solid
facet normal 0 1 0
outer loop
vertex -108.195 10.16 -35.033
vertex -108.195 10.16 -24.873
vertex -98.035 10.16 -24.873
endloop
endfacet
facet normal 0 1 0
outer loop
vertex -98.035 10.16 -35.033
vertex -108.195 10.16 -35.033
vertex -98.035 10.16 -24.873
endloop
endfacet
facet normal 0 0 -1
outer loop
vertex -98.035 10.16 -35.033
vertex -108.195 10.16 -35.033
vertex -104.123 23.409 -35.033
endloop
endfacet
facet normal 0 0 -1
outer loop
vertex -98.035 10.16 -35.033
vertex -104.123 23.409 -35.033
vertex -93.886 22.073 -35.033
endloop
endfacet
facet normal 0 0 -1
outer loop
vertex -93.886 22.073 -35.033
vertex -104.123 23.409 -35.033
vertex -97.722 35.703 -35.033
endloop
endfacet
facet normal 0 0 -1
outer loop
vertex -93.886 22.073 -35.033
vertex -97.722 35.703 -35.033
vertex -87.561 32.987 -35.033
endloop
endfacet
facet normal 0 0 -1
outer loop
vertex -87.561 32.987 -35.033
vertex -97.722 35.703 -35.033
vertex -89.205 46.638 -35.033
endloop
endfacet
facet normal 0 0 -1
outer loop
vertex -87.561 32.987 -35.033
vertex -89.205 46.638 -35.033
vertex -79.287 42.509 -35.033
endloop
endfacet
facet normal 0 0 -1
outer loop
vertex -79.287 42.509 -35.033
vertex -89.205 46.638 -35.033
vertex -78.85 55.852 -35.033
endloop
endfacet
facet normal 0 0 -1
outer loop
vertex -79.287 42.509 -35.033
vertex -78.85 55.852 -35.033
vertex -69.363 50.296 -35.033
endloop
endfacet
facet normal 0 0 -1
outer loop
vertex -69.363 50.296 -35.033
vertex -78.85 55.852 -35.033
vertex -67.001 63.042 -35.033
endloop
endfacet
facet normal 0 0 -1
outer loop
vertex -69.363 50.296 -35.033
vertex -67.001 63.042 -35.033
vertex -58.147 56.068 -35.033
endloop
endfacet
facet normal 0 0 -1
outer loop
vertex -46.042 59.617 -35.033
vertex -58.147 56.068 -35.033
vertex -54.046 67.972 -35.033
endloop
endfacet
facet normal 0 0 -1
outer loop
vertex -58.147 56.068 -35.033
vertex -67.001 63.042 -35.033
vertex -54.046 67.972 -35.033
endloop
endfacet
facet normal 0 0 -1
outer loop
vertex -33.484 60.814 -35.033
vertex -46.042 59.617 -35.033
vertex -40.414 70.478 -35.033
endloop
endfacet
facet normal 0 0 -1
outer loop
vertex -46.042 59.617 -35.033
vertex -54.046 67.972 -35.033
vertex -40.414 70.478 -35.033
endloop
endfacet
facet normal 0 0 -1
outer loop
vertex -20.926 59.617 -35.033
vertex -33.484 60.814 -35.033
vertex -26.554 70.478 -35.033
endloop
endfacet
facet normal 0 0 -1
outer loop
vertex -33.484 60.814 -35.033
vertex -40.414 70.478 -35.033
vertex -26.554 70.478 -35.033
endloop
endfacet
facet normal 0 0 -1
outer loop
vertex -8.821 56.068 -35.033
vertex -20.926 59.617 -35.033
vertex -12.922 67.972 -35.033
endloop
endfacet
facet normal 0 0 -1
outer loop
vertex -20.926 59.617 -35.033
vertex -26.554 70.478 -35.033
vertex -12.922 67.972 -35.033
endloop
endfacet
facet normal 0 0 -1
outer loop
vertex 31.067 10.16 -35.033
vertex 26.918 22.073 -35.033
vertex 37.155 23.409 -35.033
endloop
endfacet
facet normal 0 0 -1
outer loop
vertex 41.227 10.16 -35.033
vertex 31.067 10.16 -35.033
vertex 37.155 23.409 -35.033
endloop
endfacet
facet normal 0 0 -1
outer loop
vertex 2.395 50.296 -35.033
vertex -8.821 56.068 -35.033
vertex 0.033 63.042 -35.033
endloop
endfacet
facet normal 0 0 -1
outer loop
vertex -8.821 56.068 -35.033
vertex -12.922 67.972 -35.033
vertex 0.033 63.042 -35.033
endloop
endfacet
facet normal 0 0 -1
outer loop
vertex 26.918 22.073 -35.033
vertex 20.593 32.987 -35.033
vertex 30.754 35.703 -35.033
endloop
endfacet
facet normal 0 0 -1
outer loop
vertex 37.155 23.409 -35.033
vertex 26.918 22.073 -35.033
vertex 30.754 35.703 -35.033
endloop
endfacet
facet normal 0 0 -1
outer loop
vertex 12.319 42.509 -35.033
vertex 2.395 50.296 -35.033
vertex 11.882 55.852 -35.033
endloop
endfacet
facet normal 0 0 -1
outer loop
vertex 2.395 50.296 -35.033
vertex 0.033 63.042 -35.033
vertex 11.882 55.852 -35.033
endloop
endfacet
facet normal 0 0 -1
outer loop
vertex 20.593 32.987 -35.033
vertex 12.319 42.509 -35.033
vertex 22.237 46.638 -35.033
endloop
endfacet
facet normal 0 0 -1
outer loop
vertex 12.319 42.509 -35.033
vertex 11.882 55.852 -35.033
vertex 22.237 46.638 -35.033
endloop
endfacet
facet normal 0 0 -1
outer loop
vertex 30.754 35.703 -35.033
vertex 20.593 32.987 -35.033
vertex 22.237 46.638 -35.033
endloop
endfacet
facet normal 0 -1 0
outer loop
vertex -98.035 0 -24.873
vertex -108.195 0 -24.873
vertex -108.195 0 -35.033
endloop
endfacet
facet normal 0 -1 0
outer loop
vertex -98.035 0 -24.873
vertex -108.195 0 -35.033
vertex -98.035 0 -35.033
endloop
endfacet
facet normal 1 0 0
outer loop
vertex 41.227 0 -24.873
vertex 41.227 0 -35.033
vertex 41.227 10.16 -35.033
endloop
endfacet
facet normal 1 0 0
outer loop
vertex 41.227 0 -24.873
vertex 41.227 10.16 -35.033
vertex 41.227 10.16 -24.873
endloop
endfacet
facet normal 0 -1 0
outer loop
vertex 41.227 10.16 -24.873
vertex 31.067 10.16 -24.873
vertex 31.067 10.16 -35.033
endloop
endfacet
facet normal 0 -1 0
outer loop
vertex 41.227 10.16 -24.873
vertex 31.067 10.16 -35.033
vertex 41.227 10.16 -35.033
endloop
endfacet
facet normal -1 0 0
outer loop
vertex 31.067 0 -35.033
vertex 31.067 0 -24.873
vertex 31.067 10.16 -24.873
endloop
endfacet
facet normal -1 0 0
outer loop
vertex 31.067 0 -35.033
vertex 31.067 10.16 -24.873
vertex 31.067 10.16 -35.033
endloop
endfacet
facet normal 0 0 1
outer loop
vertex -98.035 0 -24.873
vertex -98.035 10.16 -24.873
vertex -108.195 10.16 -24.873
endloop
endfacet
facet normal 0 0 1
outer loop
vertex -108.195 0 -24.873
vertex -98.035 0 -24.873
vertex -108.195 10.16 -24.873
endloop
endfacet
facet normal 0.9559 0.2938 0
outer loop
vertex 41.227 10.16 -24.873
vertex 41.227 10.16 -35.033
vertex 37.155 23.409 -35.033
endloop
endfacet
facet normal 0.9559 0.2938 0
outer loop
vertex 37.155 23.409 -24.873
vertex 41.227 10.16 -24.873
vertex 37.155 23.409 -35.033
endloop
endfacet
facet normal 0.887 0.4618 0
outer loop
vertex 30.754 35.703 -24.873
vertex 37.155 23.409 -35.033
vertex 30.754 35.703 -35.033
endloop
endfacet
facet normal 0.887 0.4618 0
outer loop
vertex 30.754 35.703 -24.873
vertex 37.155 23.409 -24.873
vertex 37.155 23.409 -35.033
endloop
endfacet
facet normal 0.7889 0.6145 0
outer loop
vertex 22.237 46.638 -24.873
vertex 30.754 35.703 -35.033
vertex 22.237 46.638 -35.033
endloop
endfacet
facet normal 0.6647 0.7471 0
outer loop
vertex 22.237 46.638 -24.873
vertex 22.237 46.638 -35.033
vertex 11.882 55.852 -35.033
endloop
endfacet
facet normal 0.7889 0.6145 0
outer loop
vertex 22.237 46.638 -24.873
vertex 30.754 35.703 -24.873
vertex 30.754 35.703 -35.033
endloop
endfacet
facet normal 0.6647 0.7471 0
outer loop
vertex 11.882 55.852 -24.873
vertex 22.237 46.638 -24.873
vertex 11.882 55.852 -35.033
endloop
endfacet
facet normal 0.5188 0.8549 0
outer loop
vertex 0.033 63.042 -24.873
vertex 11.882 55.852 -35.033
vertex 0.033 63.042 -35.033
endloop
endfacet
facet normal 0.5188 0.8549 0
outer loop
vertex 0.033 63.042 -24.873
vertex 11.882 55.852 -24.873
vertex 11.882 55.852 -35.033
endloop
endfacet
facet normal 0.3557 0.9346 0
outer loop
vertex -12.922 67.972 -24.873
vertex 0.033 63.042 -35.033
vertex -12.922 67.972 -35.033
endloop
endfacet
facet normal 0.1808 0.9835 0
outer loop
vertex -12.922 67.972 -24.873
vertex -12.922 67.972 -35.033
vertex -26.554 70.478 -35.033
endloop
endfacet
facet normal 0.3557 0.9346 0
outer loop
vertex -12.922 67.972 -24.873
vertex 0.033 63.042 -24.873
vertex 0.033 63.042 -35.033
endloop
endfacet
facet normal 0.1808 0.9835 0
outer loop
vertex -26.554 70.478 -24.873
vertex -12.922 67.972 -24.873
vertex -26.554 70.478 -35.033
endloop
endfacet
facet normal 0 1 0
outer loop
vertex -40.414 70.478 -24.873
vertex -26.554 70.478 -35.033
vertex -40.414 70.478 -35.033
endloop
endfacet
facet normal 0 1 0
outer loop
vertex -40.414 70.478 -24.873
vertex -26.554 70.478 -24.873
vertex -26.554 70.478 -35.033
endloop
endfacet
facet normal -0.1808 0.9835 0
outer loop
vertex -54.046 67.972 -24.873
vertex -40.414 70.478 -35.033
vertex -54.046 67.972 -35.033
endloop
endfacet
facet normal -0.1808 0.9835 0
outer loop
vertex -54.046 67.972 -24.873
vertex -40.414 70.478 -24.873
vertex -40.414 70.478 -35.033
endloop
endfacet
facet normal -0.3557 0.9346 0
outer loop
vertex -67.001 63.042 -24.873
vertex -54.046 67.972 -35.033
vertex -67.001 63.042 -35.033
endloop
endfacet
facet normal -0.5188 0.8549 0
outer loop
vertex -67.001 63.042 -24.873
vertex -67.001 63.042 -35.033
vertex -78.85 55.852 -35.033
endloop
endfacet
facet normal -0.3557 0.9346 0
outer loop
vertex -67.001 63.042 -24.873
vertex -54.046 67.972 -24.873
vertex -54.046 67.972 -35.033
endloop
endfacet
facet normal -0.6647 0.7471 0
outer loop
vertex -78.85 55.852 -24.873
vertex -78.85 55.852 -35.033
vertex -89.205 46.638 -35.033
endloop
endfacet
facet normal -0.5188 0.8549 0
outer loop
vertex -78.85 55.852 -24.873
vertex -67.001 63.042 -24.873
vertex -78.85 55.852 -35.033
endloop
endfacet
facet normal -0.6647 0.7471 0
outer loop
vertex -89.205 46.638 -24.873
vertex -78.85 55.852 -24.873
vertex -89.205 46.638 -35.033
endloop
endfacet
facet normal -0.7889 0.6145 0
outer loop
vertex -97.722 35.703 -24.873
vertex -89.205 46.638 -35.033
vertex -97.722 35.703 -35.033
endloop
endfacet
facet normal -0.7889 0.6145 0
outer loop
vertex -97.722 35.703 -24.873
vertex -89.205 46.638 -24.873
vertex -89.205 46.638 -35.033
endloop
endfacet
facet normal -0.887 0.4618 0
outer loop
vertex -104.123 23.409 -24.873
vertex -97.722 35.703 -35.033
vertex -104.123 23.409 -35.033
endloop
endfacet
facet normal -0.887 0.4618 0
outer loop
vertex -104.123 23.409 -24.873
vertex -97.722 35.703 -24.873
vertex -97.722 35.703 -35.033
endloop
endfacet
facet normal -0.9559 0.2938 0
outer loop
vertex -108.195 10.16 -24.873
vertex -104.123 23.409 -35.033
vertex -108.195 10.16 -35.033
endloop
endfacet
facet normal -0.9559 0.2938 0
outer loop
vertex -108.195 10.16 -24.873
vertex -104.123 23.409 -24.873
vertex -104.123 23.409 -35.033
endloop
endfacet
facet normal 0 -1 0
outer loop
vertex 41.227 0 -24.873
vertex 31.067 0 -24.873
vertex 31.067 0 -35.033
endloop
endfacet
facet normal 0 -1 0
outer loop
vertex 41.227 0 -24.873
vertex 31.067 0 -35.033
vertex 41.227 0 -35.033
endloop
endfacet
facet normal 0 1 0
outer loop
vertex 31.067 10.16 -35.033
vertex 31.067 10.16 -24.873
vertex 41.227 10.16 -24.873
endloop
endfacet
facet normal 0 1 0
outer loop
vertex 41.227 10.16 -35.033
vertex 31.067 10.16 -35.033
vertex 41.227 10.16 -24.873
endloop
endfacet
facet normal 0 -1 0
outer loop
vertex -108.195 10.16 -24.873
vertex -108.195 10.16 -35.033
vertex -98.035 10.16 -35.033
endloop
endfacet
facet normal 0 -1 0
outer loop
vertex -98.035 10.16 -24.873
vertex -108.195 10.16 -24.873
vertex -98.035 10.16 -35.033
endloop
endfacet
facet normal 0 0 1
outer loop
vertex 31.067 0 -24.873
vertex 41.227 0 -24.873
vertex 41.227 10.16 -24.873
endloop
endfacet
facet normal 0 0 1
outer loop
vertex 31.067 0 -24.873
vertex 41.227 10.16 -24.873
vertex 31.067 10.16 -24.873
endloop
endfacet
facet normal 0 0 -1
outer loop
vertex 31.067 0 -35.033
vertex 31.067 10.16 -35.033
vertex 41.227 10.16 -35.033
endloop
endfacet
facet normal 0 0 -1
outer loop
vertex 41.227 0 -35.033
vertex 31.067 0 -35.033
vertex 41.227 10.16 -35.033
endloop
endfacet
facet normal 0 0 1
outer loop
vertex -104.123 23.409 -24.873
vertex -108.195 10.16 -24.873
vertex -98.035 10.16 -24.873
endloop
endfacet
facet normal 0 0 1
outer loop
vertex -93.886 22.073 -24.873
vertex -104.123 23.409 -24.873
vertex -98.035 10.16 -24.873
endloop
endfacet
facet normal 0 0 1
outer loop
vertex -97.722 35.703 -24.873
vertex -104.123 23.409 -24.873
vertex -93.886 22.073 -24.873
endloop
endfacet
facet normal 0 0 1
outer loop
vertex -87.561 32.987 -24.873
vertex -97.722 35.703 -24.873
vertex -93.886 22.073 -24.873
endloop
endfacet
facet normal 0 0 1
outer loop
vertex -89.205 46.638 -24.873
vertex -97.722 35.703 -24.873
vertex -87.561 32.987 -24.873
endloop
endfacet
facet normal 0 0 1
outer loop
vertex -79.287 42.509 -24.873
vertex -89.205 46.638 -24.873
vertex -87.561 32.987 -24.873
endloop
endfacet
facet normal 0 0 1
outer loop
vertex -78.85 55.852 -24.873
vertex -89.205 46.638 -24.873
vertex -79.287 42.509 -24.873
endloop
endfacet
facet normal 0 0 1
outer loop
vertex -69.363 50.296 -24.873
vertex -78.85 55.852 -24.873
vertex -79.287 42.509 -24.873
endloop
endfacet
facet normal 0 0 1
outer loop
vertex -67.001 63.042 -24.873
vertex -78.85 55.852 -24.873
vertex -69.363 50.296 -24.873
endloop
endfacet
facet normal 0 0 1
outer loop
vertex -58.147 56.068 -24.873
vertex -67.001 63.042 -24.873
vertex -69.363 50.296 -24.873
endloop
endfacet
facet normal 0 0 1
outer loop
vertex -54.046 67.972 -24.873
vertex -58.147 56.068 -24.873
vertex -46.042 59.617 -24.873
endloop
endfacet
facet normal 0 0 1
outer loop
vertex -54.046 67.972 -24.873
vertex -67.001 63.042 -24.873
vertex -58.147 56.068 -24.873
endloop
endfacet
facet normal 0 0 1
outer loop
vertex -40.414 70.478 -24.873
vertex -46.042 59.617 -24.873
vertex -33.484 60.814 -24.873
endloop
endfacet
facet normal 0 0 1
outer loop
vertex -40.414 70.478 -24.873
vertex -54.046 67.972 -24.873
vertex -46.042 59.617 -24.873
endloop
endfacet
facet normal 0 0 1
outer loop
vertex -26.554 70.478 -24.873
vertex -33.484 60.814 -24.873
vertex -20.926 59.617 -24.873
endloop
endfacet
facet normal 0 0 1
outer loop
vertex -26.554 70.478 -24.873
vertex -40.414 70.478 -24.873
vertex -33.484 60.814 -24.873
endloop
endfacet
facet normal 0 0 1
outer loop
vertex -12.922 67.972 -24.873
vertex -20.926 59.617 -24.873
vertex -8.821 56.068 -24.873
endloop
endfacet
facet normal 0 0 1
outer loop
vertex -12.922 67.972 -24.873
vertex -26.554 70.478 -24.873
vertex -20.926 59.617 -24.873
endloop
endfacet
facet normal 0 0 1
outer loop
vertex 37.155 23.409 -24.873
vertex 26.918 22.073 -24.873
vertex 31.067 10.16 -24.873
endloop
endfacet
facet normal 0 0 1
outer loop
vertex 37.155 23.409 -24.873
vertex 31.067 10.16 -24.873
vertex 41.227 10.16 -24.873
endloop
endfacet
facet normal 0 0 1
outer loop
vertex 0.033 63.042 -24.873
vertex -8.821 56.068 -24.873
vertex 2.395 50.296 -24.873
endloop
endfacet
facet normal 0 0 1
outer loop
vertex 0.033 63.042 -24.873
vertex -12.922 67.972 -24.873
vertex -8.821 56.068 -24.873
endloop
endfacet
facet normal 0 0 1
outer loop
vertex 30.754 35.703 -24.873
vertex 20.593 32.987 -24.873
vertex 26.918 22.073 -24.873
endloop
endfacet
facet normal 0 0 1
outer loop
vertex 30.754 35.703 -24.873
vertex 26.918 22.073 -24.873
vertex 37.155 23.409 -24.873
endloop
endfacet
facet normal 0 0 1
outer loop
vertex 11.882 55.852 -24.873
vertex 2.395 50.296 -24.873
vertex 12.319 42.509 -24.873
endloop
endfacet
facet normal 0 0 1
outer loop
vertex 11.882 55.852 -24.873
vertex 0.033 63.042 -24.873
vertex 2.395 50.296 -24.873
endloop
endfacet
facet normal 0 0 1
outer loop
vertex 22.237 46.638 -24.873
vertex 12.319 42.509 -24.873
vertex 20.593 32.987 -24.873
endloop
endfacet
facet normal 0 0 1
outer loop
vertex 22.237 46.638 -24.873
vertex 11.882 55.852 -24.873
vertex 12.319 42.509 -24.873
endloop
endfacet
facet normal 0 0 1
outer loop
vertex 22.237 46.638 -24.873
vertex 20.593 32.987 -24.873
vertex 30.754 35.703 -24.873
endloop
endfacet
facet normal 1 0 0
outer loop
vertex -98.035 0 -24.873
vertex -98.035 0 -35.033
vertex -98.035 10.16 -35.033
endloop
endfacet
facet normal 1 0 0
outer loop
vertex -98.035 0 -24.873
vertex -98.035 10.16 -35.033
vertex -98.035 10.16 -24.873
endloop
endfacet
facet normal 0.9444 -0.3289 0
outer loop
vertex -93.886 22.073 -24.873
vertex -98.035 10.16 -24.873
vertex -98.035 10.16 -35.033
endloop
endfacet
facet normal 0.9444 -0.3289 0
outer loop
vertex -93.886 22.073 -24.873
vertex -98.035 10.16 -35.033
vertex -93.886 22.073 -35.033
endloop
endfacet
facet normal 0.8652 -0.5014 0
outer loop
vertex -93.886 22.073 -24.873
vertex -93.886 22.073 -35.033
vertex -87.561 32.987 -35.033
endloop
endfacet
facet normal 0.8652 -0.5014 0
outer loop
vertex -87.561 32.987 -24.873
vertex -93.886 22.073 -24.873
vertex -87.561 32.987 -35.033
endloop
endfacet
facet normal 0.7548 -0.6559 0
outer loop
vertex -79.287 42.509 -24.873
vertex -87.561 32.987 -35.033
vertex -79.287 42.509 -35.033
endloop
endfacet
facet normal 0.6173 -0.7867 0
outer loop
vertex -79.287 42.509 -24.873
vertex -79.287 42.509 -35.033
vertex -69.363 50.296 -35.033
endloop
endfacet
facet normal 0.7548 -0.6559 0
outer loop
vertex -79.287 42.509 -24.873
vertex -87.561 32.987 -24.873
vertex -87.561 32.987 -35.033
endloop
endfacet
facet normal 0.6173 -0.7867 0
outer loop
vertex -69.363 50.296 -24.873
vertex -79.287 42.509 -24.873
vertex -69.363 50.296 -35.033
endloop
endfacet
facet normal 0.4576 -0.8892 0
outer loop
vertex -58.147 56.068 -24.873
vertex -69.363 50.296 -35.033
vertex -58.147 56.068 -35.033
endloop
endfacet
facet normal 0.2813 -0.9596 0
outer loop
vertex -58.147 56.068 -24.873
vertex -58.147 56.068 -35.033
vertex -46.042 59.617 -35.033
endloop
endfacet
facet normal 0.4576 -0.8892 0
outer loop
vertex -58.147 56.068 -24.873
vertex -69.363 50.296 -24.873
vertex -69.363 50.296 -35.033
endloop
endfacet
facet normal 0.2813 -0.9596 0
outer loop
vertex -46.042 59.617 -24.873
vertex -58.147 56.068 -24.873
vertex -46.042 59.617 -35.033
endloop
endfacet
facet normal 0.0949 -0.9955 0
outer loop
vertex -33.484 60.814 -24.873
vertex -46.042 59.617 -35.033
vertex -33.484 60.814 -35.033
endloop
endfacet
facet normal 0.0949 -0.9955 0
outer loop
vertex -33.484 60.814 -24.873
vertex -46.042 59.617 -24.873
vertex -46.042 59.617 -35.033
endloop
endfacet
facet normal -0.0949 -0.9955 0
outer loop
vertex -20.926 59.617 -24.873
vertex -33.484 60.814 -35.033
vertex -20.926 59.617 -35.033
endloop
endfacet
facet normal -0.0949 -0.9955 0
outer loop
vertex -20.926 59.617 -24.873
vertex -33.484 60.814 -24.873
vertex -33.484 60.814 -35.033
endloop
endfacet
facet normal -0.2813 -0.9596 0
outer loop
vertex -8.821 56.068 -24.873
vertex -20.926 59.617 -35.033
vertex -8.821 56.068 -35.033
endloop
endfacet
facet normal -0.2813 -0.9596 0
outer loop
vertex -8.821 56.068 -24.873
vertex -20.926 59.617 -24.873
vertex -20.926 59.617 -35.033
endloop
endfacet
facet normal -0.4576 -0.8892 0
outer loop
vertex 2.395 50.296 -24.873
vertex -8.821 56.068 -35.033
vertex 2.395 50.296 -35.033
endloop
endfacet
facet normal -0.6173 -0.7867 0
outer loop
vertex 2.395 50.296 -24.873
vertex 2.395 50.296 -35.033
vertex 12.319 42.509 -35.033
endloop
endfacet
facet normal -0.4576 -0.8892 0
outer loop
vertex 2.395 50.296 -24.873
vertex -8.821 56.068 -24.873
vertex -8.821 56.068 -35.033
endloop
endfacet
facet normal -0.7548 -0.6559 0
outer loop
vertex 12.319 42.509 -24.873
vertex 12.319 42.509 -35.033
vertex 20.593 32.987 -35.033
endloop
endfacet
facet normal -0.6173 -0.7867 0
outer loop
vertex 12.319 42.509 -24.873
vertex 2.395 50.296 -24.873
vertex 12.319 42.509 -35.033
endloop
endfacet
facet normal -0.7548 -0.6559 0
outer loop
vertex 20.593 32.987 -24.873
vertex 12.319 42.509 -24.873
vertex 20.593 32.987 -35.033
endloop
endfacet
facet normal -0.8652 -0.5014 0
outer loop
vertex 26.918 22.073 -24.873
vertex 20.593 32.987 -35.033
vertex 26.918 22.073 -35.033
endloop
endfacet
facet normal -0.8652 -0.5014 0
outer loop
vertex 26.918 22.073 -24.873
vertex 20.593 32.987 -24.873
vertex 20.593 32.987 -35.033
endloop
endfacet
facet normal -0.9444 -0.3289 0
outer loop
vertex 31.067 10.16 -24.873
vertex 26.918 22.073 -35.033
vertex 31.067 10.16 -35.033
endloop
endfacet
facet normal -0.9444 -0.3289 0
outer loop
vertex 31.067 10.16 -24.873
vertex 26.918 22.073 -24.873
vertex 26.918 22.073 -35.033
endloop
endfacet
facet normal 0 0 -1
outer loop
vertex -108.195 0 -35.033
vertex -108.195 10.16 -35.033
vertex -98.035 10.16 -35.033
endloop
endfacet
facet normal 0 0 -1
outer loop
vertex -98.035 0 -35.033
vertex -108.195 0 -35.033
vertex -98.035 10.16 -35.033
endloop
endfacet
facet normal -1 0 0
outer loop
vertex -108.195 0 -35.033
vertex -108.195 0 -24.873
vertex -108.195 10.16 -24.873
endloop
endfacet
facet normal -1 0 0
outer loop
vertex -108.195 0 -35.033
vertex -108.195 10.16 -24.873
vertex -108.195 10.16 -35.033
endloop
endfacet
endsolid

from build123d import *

# Parameters (mm, degrees)
F1_DEPTH = 10.16
F3_DEPTH = 10.16


with BuildPart() as f1:
    # F0 (on Front) → F1 (new body)
    with BuildSketch(Plane.XZ):
        Polygon((-108.194865, -24.872656), (-108.194865, -35.032656), (-98.034865, -35.032656), (-98.034865, -24.872656), (-103.114865, -24.872656), align=None)
        Polygon((31.066807, -24.872535), (31.066807, -35.032535), (41.226807, -35.032535), (41.226807, -24.872535), (36.146807, -24.872535), align=None)
    extrude(amount=-F1_DEPTH)


with BuildPart() as f3:
    # F2 (on face) → F3 (new body)
    with BuildSketch(Plane.XY.offset(-24.872656)):
        with BuildLine():
            Line((-108.194865, 10.16), (-98.034865, 10.16))
            ThreePointArc((-98.034865, 10.16), (-33.484029, 60.813956), (31.066807, 10.16))
            Line((31.066807, 10.16), (41.226807, 10.16))
            ThreePointArc((41.226807, 10.16), (-33.484029, 70.792874), (-108.194865, 10.16))
        make_face()
    extrude(amount=-F3_DEPTH)


solid = Compound([f1.part, f3.part])
